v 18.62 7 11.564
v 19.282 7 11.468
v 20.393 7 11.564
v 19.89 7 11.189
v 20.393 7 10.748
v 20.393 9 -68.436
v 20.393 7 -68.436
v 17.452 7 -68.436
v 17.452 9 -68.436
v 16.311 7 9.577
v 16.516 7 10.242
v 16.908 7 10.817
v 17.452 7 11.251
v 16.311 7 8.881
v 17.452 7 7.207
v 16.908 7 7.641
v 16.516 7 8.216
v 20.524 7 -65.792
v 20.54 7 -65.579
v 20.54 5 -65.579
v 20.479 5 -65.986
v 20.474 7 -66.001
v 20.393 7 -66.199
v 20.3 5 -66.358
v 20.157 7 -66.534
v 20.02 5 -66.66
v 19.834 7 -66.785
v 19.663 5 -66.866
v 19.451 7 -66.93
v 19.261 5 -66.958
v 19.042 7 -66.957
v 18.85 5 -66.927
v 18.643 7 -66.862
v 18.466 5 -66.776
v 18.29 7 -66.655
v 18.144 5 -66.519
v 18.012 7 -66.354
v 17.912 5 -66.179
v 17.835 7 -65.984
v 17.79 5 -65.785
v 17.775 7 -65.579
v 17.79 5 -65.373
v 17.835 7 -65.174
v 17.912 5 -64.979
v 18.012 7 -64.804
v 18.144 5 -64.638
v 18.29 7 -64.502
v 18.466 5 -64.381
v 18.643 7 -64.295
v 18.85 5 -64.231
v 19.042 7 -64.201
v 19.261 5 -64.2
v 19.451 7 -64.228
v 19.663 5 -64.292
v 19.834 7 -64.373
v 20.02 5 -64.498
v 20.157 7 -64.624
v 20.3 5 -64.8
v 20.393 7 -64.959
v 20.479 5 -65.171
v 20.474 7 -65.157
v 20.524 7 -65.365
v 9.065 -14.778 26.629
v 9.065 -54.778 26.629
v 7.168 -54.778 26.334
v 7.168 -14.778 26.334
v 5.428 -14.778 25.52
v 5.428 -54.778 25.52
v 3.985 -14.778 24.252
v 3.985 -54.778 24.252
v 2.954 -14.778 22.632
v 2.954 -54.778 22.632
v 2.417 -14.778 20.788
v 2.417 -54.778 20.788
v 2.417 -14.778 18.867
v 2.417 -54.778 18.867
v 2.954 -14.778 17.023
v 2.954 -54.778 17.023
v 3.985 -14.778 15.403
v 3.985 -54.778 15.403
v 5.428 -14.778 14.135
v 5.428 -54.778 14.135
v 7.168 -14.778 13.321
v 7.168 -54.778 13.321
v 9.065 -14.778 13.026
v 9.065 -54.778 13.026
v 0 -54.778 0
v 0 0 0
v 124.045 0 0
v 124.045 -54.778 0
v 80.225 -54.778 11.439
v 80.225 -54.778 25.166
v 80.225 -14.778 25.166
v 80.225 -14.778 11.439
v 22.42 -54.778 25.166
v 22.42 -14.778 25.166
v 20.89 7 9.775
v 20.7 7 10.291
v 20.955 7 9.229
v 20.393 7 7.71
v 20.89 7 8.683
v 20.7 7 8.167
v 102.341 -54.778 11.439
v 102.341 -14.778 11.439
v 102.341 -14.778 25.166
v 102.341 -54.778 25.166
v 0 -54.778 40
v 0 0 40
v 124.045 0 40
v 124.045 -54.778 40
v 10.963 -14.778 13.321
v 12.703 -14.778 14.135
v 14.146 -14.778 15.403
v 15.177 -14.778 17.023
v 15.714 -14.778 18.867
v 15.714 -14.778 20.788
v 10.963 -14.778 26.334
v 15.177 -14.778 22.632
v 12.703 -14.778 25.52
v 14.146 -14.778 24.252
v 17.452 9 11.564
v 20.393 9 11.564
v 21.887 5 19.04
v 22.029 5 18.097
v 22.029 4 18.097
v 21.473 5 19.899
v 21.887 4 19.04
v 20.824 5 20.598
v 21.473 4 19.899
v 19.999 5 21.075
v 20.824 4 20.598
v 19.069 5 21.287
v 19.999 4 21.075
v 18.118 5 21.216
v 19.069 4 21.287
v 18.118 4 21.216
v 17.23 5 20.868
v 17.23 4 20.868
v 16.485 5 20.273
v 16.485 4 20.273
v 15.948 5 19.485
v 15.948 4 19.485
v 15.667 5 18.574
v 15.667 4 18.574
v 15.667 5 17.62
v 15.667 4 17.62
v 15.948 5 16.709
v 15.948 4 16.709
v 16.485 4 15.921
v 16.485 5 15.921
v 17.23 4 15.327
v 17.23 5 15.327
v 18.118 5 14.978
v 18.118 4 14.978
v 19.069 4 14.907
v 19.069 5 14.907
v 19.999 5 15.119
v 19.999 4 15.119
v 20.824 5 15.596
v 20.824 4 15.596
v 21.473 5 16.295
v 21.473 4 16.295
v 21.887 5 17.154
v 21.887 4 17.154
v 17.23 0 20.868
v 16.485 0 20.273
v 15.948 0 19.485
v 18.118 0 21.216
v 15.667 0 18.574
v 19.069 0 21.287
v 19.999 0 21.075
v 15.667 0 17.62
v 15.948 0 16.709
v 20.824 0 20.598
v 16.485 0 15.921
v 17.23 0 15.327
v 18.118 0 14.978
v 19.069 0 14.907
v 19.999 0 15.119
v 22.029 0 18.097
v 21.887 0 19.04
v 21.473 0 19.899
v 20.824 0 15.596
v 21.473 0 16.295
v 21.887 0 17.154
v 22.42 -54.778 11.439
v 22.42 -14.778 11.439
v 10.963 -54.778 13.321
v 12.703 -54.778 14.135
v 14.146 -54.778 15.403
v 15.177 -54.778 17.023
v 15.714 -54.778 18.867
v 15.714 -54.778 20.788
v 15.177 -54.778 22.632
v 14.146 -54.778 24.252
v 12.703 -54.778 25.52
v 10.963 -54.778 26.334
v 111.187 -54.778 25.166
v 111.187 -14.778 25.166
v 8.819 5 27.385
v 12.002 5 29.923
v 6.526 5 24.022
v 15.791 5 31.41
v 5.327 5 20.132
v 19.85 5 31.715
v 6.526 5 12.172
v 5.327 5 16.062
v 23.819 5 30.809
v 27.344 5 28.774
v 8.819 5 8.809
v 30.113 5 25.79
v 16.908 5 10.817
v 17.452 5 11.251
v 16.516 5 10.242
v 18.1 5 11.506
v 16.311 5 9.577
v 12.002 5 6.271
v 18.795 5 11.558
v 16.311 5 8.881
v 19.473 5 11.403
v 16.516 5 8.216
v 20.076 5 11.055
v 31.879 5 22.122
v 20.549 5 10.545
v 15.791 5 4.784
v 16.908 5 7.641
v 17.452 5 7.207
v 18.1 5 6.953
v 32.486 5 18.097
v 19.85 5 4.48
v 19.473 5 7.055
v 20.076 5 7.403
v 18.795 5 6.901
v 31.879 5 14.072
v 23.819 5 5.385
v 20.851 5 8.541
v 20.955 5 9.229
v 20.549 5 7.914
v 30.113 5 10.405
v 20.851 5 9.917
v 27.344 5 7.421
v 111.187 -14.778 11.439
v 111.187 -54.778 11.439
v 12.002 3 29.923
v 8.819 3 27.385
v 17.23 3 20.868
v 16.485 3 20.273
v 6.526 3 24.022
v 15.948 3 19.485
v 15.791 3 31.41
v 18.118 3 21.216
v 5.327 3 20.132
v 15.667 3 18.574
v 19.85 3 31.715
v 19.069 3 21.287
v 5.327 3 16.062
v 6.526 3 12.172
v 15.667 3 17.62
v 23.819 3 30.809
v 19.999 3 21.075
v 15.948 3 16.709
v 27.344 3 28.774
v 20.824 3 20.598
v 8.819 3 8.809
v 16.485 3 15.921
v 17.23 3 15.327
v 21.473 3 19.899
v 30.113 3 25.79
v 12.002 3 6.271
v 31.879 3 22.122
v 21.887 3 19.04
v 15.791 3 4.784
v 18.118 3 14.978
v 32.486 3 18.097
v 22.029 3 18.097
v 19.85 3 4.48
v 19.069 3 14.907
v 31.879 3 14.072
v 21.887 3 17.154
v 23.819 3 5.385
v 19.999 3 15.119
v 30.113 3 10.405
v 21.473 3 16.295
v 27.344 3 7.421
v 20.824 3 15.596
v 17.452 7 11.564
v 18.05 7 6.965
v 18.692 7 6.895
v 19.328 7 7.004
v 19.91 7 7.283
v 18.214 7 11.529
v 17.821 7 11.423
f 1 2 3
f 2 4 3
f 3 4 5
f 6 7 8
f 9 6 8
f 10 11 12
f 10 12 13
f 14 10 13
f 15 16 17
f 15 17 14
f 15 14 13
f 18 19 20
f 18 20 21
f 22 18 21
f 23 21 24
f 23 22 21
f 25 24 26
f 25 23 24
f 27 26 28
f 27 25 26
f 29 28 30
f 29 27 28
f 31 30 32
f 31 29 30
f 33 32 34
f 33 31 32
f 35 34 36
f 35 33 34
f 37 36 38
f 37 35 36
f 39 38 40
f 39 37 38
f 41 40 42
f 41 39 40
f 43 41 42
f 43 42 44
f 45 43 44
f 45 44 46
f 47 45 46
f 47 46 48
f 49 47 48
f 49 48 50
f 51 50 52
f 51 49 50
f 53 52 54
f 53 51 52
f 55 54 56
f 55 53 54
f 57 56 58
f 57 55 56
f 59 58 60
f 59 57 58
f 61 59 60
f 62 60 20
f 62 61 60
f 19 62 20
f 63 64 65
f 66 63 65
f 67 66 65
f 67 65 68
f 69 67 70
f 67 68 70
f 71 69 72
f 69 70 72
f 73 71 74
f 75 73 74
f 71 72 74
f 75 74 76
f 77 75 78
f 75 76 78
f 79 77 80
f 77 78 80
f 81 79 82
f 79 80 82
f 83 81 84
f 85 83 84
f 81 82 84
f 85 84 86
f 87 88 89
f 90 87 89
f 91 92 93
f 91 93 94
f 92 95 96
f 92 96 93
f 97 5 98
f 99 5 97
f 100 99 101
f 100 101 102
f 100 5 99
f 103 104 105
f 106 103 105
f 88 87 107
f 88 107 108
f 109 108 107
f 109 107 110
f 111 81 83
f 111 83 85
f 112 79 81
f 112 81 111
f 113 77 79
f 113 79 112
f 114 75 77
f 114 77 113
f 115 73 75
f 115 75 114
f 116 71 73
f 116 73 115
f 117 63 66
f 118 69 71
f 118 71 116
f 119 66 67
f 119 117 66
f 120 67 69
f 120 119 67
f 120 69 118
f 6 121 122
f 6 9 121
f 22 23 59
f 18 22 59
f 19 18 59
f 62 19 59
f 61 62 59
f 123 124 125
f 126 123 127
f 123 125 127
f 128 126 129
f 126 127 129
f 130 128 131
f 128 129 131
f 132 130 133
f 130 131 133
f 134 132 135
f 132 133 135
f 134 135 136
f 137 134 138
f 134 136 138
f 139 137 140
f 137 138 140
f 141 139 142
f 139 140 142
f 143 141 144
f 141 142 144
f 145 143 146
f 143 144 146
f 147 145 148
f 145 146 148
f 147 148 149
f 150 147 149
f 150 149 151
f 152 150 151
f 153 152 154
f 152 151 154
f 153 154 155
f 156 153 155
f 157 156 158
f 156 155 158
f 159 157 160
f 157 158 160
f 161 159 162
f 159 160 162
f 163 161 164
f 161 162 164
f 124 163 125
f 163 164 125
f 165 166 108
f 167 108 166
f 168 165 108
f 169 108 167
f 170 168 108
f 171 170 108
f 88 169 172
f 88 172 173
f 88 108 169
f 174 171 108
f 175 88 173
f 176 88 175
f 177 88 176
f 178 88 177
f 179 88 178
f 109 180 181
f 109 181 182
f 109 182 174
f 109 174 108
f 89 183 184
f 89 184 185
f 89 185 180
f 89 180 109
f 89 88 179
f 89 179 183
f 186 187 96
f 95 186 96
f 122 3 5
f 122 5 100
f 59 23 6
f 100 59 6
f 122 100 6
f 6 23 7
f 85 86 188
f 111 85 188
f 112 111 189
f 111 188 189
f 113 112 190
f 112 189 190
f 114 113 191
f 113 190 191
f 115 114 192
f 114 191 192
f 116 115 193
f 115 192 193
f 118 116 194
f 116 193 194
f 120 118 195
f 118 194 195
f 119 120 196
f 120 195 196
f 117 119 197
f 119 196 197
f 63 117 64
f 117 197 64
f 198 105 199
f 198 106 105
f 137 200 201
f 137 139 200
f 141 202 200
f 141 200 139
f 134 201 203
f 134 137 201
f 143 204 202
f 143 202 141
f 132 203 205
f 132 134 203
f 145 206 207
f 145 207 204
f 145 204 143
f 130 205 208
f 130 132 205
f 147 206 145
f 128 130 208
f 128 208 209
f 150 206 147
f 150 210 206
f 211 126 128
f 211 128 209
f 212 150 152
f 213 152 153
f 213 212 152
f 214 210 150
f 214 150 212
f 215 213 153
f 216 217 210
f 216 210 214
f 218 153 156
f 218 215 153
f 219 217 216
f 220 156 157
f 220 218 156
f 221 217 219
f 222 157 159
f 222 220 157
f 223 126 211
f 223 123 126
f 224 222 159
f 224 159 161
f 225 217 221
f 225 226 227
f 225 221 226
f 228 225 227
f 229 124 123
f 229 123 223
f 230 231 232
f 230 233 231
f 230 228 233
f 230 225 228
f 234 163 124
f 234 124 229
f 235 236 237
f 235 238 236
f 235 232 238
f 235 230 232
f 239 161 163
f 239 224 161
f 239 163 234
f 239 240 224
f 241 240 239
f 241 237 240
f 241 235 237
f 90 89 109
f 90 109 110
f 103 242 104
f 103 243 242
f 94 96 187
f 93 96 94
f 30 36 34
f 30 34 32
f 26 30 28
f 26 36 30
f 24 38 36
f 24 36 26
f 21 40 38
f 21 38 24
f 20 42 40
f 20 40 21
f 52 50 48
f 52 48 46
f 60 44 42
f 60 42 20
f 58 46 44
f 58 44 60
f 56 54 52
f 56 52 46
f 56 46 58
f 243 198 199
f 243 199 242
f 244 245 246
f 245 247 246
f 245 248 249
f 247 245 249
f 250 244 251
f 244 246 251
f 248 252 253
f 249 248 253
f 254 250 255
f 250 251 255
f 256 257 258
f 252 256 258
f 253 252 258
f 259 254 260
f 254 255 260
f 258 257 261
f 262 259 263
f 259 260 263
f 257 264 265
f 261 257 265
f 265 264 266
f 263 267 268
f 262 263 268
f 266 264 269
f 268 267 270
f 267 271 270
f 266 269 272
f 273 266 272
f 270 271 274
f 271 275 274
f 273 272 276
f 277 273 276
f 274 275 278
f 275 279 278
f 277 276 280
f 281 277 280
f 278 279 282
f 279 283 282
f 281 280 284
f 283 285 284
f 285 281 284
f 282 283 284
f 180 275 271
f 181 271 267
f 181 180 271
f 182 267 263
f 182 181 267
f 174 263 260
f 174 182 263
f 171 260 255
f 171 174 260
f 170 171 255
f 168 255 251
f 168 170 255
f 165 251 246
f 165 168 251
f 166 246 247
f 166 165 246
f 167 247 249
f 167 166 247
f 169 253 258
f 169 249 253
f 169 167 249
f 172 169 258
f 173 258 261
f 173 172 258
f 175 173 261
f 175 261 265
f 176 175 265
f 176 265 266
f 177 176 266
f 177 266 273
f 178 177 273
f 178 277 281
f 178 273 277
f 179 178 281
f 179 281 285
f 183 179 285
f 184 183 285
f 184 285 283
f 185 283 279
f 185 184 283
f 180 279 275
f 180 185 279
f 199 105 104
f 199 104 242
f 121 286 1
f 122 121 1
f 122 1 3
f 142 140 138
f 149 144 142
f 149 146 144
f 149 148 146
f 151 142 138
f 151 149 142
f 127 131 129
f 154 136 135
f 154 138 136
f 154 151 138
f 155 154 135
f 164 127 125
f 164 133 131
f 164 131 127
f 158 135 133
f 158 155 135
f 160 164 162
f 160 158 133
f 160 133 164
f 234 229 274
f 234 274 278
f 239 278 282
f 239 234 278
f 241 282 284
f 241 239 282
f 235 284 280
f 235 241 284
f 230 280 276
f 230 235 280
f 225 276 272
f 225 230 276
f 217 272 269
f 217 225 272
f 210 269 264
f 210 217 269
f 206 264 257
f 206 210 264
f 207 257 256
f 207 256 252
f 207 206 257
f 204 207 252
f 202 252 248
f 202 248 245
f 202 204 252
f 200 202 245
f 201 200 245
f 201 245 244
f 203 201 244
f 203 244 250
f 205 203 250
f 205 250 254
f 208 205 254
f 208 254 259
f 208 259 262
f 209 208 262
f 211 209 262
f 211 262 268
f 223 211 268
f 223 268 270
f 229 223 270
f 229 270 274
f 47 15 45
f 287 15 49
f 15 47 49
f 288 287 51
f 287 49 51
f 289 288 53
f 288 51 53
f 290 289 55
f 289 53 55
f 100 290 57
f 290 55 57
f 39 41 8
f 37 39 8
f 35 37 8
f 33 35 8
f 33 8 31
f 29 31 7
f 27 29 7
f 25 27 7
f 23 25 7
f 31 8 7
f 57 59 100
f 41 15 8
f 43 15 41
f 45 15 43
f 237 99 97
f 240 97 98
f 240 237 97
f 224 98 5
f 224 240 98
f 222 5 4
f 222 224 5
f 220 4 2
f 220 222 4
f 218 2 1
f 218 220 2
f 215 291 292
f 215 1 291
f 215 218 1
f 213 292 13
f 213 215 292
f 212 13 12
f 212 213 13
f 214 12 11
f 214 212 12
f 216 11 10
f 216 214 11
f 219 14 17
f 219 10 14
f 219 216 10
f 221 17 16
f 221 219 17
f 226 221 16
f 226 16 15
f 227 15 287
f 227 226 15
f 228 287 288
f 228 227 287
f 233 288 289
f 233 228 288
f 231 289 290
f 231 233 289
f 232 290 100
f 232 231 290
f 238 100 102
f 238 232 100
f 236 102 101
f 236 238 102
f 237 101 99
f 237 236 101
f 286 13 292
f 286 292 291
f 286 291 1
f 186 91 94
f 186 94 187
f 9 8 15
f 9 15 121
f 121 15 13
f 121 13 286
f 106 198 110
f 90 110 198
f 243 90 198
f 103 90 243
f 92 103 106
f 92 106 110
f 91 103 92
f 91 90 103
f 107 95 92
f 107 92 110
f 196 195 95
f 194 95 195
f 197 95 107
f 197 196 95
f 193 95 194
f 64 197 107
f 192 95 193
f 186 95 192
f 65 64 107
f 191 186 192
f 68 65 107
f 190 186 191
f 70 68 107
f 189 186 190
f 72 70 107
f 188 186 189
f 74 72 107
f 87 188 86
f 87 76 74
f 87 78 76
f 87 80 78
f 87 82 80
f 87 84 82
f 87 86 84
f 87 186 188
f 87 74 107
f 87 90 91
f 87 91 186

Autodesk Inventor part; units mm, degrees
ref_plane "YZ Plane" through (0, 0, 0) normal (1, 0, 0) x (0, 1, 0)
ref_plane "XZ Plane" through (0, 0, 0) normal (0, 1, 0) x (-1, 0, 0)
ref_plane "XY Plane" through (0, 0, 0) normal (0, 0, 1) x (1, 0, 0)
sketch "Sketch1" plane through (0, 0, 0) normal (0, 0, 1) x (1, 0, 0)
  line L0 (0, 0) -> (124.045, 0)
  line L1 (124.045, 0) -> (124.045, -54.7779)
  line L2 (124.045, -54.7779) -> (0, -54.7779)
  line L3 (0, -54.7779) -> (0, 0)
extrude "Extrusion1" add sketch "Sketch1" along normal blind 40
sketch "Sketch2" plane through (0, -54.7779, 0) normal (0, -1, 0) x (1, 0, 0)
  circle A0 centre (9.1512, 19.8276) radius 6.8021
  circle A1 centre (8.9796, 19.8276) radius 6.8021
  line L0 (22.4204, 25.1658) -> (80.2254, 25.1658)
  line L1 (80.2254, 25.1658) -> (80.2254, 11.439)
  line L2 (80.2254, 11.439) -> (22.4204, 11.439)
  line L3 (22.4204, 11.439) -> (22.4204, 25.1658)
  line L4 (102.3407, 25.1658) -> (111.1869, 25.1658)
  line L5 (111.1869, 25.1658) -> (111.1869, 11.439)
  line L6 (111.1869, 11.439) -> (102.3407, 11.439)
  line L7 (102.3407, 11.439) -> (102.3407, 25.1658)
  point P0 (0, 0)
  point P1 (9.0654, 26.6291)
  point P2 (9.0654, 13.026)
extrude "Extrusion2" cut sketch "Sketch2" against normal blind 40 contours A1 A0 | L0 L1 L2 L3 | L4 L5 L6 L7 picked at (6.8592, 19.8276)
sketch "Sketch3" plane through (0, 0, 0) normal (0, 1, 0) x (1, 0, 0)
  circle A0 centre (18.8298, -18.0971) radius 3.199
  arc A1 (9.0654, -26.6291) -> (9.0654, -13.026) centre (8.9796, -19.8276) ccw projected
  point P0 (0, 0)
extrude "Extrusion3" add sketch "Sketch3" along normal blind 4
sketch "Sketch4" plane through (18.8298, 4, 18.0971) normal (0, 1, 0) x (1, 0, 0)
  circle A0 centre (0, 0) radius 3.199 projected
  circle A1 centre (0, 0) radius 13.6557
  point P0 (-18.8298, 18.0971)
extrude "Extrusion4" add sketch "Sketch4" along normal mid plane 2
sketch "Sketch5" plane through (18.8298, 5, 18.0971) normal (0, 1, 0) x (1, 0, 0)
  circle A0 centre (-0.2098, 8.868) radius 2.3351
  point P0 (-18.8298, 18.0971)
extrude "Extrusion5" add sketch "Sketch5" along normal blind 2
sketch "Sketch6" plane through (18.62, 7, 9.2291) normal (0, 1, 0) x (1, 0, 0)
  line L0 (1.7734, 77.6649) -> (-1.1678, 77.6649)
  line L1 (-1.1678, 77.6649) -> (-1.1678, -2.3351)
  line L2 (-1.1678, -2.3351) -> (1.7734, -2.3351)
  line L3 (1.7734, -2.3351) -> (1.7734, 77.6649)
  line L4 (1.7734, 77.6649) -> (-1.1678, -2.3351) construction
  line L5 (-1.1678, 77.6649) -> (1.7734, -2.3351) construction
  point P0 (-18.62, 9.2291)
  point P1 (0.3028, 37.6649)
  dimension "d10" = 80
extrude "Extrusion6" add sketch "Sketch6" along normal blind 2
sketch "Sketch7" plane through (0, 0, 0) normal (0, 0, -1) x (-1, 0, 0)
  point P0 (0, 0)
sketch "Sketch8" plane through (18.62, 7, 9.2291) normal (0, -1, 0) x (1, 0, 0)
  circle A0 centre (0.5375, -74.8079) radius 1.3827
  point P0 (-18.62, -9.2291)
extrude "Extrusion7" add sketch "Sketch8" along normal blind 2
properties part number "fnal"
